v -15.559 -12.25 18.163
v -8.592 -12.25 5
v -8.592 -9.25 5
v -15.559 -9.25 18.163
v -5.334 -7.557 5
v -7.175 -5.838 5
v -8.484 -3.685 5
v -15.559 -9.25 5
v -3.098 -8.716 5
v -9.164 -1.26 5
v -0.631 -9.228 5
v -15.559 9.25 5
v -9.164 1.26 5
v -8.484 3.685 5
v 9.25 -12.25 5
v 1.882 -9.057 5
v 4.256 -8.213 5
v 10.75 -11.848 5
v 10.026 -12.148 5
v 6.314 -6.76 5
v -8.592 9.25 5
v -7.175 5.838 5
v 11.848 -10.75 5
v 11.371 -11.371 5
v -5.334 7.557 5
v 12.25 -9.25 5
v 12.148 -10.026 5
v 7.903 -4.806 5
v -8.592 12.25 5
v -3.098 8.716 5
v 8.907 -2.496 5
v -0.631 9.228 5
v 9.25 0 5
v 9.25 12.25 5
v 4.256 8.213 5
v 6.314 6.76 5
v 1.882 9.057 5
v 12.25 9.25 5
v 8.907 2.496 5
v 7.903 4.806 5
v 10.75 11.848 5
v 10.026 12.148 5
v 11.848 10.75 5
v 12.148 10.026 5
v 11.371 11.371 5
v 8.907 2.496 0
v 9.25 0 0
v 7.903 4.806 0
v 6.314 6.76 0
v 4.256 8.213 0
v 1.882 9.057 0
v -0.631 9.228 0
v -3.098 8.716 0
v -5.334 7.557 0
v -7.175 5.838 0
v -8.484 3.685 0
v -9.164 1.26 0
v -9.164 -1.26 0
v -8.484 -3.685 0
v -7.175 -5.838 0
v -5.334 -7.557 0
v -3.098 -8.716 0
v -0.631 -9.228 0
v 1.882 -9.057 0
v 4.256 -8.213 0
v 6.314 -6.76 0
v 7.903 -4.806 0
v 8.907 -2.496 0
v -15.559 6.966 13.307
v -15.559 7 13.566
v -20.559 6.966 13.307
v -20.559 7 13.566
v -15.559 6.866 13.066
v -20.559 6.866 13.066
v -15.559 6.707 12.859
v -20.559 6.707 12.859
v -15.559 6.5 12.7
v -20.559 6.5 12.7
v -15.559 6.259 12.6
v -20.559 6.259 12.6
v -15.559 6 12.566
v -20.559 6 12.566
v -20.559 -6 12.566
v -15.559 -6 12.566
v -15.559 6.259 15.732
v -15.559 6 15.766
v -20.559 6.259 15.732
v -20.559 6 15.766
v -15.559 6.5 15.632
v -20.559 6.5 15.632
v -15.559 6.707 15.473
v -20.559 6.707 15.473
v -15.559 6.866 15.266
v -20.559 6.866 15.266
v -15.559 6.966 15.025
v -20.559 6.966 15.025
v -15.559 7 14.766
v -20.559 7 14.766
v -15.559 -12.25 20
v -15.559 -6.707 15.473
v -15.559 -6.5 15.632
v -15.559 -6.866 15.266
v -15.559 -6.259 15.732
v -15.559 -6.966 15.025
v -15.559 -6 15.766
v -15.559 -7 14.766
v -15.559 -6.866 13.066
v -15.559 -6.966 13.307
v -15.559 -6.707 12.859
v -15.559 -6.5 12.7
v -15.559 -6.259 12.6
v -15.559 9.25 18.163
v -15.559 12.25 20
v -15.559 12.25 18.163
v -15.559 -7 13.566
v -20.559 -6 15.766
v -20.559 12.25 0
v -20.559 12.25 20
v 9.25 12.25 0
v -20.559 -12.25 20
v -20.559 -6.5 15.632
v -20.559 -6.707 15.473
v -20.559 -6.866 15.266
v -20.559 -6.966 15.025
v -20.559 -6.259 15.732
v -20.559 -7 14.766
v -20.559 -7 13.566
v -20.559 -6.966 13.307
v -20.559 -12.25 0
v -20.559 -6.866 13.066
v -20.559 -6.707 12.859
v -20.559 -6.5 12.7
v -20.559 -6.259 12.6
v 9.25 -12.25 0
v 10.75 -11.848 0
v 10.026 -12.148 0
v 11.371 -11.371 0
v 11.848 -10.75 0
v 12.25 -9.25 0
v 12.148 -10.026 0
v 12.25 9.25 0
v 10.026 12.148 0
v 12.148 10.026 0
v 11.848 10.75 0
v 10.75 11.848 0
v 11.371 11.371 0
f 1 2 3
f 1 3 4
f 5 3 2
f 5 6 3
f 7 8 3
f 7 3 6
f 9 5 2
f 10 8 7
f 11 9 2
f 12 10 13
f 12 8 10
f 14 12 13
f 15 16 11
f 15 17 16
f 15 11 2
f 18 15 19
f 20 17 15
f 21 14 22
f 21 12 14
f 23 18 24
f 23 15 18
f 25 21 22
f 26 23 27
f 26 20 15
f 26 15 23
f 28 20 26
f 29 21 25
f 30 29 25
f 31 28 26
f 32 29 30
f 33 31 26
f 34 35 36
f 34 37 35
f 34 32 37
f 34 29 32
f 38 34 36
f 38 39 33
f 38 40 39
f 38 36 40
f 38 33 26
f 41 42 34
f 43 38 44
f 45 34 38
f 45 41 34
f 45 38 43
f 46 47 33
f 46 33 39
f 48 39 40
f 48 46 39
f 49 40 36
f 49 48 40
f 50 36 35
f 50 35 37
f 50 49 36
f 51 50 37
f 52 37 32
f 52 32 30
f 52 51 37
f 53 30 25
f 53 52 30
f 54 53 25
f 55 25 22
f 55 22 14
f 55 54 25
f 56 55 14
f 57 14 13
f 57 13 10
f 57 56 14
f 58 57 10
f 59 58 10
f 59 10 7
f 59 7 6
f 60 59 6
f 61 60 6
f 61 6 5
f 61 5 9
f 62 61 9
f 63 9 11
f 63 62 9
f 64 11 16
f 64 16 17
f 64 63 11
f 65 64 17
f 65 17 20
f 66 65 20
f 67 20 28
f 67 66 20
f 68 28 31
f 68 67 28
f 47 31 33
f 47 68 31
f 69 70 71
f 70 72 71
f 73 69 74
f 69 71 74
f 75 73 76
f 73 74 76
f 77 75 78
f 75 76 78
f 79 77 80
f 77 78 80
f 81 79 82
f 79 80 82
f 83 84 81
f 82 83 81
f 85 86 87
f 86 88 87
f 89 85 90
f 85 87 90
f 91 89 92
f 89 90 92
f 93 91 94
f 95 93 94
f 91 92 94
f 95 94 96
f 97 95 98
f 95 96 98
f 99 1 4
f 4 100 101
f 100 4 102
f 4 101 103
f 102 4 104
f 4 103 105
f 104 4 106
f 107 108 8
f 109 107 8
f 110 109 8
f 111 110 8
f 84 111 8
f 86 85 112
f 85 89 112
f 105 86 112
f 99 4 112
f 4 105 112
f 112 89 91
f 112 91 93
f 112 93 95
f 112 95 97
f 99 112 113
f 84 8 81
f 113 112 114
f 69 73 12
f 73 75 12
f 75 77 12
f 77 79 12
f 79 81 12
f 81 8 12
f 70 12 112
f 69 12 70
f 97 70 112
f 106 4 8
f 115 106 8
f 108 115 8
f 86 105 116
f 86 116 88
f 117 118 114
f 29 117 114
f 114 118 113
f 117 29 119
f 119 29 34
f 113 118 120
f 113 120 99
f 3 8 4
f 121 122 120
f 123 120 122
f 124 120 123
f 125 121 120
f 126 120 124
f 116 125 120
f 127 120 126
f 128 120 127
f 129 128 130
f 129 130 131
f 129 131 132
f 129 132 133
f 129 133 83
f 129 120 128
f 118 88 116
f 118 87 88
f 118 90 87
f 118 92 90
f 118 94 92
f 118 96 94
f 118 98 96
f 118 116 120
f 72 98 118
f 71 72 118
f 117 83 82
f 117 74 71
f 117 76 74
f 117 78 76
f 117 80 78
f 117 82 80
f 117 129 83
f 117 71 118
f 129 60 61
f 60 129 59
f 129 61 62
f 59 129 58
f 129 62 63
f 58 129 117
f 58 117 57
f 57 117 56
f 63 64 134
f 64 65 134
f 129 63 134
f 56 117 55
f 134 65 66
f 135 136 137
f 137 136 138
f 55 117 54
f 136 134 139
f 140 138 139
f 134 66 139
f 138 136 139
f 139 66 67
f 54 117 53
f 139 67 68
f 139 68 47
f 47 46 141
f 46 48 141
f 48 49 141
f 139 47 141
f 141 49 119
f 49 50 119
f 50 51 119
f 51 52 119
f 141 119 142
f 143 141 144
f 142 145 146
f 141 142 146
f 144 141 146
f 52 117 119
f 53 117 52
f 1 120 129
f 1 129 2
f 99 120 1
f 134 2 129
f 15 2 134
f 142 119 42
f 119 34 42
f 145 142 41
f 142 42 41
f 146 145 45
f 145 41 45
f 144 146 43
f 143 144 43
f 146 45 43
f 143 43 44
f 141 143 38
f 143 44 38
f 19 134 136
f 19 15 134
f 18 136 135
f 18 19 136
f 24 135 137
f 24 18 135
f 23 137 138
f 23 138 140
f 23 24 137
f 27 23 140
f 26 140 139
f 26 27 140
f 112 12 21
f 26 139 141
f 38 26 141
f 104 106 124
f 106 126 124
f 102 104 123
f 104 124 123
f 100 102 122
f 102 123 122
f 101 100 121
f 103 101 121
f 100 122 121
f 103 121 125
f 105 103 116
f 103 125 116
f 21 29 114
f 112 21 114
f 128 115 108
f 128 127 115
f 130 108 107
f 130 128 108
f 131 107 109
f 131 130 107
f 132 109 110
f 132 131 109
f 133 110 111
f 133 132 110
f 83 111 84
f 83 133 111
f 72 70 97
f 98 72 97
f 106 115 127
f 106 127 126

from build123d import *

# Parameters (mm, degrees)
F0_W     = 32.809374243
F0_H     = 24.5
F0_R     = 9.25
F1_DEPTH = 5
F2_W     = 5
F2_H     = 24.5
F3_DEPTH = 15
F5_DEPTH = 3
F6_W     = 14
F6_H     = 3.2
F7_DEPTH = 25
F8_R     = 1
F9_R     = 3


# Not quite as in the source:
# - a pattern or mirror of a feature is missing from the dataset's text; its kind, count and spacing are read off the source's solid


with BuildPart() as f1:
    # F0 (on Top) → F1 (new body)
    with BuildSketch(Plane.XY):
        with Locations((-4.1546871215, 0)):
            Rectangle(F0_W, F0_H)
        Circle(F0_R, mode=Mode.SUBTRACT)
    extrude(amount=F1_DEPTH)

    # F2 (on face) → F3 (join)
    with BuildSketch(Plane.XY.offset(5)):
        with Locations((-18.059374243, 0)):
            Rectangle(F2_W, F2_H)
    extrude(amount=F3_DEPTH)

    # F4 (on face) → F5 (join)
    with BuildSketch(Plane.XZ.offset(12.25)):
        Polygon((-8.5921417922, 5), (-15.559374243, 18.1631296873), (-15.559374243, 5), align=None)
    f5 = extrude(amount=-F5_DEPTH)

    # F5_copies: F5 across plane
    add(f5.mirror(Plane.ZX))

    # F6 (on face) → F7 (cut)
    with BuildSketch(Plane.YZ.offset(-15.559374243)):
        with Locations((0, 14.1660655677)):
            Rectangle(F6_W, F6_H)
    extrude(amount=-F7_DEPTH, mode=Mode.SUBTRACT)

    # F8
    f8_edges = [f1.edges().sort_by_distance(p)[0] for p in [
        (-18.059374, 7, 12.566066),
        (-18.059374, 7, 15.766066),
        (-18.059374, -7, 12.566066),
        (-18.059374, -7, 15.766066),
    ]]
    fillet(f8_edges, radius=F8_R)

    # F9
    f9_edges = [f1.edges().sort_by_distance(p)[0] for p in [
        (12.25, -12.25, 2.5),
        (12.25, 12.25, 2.5),
    ]]
    fillet(f9_edges, radius=F9_R)


solid = f1.part
